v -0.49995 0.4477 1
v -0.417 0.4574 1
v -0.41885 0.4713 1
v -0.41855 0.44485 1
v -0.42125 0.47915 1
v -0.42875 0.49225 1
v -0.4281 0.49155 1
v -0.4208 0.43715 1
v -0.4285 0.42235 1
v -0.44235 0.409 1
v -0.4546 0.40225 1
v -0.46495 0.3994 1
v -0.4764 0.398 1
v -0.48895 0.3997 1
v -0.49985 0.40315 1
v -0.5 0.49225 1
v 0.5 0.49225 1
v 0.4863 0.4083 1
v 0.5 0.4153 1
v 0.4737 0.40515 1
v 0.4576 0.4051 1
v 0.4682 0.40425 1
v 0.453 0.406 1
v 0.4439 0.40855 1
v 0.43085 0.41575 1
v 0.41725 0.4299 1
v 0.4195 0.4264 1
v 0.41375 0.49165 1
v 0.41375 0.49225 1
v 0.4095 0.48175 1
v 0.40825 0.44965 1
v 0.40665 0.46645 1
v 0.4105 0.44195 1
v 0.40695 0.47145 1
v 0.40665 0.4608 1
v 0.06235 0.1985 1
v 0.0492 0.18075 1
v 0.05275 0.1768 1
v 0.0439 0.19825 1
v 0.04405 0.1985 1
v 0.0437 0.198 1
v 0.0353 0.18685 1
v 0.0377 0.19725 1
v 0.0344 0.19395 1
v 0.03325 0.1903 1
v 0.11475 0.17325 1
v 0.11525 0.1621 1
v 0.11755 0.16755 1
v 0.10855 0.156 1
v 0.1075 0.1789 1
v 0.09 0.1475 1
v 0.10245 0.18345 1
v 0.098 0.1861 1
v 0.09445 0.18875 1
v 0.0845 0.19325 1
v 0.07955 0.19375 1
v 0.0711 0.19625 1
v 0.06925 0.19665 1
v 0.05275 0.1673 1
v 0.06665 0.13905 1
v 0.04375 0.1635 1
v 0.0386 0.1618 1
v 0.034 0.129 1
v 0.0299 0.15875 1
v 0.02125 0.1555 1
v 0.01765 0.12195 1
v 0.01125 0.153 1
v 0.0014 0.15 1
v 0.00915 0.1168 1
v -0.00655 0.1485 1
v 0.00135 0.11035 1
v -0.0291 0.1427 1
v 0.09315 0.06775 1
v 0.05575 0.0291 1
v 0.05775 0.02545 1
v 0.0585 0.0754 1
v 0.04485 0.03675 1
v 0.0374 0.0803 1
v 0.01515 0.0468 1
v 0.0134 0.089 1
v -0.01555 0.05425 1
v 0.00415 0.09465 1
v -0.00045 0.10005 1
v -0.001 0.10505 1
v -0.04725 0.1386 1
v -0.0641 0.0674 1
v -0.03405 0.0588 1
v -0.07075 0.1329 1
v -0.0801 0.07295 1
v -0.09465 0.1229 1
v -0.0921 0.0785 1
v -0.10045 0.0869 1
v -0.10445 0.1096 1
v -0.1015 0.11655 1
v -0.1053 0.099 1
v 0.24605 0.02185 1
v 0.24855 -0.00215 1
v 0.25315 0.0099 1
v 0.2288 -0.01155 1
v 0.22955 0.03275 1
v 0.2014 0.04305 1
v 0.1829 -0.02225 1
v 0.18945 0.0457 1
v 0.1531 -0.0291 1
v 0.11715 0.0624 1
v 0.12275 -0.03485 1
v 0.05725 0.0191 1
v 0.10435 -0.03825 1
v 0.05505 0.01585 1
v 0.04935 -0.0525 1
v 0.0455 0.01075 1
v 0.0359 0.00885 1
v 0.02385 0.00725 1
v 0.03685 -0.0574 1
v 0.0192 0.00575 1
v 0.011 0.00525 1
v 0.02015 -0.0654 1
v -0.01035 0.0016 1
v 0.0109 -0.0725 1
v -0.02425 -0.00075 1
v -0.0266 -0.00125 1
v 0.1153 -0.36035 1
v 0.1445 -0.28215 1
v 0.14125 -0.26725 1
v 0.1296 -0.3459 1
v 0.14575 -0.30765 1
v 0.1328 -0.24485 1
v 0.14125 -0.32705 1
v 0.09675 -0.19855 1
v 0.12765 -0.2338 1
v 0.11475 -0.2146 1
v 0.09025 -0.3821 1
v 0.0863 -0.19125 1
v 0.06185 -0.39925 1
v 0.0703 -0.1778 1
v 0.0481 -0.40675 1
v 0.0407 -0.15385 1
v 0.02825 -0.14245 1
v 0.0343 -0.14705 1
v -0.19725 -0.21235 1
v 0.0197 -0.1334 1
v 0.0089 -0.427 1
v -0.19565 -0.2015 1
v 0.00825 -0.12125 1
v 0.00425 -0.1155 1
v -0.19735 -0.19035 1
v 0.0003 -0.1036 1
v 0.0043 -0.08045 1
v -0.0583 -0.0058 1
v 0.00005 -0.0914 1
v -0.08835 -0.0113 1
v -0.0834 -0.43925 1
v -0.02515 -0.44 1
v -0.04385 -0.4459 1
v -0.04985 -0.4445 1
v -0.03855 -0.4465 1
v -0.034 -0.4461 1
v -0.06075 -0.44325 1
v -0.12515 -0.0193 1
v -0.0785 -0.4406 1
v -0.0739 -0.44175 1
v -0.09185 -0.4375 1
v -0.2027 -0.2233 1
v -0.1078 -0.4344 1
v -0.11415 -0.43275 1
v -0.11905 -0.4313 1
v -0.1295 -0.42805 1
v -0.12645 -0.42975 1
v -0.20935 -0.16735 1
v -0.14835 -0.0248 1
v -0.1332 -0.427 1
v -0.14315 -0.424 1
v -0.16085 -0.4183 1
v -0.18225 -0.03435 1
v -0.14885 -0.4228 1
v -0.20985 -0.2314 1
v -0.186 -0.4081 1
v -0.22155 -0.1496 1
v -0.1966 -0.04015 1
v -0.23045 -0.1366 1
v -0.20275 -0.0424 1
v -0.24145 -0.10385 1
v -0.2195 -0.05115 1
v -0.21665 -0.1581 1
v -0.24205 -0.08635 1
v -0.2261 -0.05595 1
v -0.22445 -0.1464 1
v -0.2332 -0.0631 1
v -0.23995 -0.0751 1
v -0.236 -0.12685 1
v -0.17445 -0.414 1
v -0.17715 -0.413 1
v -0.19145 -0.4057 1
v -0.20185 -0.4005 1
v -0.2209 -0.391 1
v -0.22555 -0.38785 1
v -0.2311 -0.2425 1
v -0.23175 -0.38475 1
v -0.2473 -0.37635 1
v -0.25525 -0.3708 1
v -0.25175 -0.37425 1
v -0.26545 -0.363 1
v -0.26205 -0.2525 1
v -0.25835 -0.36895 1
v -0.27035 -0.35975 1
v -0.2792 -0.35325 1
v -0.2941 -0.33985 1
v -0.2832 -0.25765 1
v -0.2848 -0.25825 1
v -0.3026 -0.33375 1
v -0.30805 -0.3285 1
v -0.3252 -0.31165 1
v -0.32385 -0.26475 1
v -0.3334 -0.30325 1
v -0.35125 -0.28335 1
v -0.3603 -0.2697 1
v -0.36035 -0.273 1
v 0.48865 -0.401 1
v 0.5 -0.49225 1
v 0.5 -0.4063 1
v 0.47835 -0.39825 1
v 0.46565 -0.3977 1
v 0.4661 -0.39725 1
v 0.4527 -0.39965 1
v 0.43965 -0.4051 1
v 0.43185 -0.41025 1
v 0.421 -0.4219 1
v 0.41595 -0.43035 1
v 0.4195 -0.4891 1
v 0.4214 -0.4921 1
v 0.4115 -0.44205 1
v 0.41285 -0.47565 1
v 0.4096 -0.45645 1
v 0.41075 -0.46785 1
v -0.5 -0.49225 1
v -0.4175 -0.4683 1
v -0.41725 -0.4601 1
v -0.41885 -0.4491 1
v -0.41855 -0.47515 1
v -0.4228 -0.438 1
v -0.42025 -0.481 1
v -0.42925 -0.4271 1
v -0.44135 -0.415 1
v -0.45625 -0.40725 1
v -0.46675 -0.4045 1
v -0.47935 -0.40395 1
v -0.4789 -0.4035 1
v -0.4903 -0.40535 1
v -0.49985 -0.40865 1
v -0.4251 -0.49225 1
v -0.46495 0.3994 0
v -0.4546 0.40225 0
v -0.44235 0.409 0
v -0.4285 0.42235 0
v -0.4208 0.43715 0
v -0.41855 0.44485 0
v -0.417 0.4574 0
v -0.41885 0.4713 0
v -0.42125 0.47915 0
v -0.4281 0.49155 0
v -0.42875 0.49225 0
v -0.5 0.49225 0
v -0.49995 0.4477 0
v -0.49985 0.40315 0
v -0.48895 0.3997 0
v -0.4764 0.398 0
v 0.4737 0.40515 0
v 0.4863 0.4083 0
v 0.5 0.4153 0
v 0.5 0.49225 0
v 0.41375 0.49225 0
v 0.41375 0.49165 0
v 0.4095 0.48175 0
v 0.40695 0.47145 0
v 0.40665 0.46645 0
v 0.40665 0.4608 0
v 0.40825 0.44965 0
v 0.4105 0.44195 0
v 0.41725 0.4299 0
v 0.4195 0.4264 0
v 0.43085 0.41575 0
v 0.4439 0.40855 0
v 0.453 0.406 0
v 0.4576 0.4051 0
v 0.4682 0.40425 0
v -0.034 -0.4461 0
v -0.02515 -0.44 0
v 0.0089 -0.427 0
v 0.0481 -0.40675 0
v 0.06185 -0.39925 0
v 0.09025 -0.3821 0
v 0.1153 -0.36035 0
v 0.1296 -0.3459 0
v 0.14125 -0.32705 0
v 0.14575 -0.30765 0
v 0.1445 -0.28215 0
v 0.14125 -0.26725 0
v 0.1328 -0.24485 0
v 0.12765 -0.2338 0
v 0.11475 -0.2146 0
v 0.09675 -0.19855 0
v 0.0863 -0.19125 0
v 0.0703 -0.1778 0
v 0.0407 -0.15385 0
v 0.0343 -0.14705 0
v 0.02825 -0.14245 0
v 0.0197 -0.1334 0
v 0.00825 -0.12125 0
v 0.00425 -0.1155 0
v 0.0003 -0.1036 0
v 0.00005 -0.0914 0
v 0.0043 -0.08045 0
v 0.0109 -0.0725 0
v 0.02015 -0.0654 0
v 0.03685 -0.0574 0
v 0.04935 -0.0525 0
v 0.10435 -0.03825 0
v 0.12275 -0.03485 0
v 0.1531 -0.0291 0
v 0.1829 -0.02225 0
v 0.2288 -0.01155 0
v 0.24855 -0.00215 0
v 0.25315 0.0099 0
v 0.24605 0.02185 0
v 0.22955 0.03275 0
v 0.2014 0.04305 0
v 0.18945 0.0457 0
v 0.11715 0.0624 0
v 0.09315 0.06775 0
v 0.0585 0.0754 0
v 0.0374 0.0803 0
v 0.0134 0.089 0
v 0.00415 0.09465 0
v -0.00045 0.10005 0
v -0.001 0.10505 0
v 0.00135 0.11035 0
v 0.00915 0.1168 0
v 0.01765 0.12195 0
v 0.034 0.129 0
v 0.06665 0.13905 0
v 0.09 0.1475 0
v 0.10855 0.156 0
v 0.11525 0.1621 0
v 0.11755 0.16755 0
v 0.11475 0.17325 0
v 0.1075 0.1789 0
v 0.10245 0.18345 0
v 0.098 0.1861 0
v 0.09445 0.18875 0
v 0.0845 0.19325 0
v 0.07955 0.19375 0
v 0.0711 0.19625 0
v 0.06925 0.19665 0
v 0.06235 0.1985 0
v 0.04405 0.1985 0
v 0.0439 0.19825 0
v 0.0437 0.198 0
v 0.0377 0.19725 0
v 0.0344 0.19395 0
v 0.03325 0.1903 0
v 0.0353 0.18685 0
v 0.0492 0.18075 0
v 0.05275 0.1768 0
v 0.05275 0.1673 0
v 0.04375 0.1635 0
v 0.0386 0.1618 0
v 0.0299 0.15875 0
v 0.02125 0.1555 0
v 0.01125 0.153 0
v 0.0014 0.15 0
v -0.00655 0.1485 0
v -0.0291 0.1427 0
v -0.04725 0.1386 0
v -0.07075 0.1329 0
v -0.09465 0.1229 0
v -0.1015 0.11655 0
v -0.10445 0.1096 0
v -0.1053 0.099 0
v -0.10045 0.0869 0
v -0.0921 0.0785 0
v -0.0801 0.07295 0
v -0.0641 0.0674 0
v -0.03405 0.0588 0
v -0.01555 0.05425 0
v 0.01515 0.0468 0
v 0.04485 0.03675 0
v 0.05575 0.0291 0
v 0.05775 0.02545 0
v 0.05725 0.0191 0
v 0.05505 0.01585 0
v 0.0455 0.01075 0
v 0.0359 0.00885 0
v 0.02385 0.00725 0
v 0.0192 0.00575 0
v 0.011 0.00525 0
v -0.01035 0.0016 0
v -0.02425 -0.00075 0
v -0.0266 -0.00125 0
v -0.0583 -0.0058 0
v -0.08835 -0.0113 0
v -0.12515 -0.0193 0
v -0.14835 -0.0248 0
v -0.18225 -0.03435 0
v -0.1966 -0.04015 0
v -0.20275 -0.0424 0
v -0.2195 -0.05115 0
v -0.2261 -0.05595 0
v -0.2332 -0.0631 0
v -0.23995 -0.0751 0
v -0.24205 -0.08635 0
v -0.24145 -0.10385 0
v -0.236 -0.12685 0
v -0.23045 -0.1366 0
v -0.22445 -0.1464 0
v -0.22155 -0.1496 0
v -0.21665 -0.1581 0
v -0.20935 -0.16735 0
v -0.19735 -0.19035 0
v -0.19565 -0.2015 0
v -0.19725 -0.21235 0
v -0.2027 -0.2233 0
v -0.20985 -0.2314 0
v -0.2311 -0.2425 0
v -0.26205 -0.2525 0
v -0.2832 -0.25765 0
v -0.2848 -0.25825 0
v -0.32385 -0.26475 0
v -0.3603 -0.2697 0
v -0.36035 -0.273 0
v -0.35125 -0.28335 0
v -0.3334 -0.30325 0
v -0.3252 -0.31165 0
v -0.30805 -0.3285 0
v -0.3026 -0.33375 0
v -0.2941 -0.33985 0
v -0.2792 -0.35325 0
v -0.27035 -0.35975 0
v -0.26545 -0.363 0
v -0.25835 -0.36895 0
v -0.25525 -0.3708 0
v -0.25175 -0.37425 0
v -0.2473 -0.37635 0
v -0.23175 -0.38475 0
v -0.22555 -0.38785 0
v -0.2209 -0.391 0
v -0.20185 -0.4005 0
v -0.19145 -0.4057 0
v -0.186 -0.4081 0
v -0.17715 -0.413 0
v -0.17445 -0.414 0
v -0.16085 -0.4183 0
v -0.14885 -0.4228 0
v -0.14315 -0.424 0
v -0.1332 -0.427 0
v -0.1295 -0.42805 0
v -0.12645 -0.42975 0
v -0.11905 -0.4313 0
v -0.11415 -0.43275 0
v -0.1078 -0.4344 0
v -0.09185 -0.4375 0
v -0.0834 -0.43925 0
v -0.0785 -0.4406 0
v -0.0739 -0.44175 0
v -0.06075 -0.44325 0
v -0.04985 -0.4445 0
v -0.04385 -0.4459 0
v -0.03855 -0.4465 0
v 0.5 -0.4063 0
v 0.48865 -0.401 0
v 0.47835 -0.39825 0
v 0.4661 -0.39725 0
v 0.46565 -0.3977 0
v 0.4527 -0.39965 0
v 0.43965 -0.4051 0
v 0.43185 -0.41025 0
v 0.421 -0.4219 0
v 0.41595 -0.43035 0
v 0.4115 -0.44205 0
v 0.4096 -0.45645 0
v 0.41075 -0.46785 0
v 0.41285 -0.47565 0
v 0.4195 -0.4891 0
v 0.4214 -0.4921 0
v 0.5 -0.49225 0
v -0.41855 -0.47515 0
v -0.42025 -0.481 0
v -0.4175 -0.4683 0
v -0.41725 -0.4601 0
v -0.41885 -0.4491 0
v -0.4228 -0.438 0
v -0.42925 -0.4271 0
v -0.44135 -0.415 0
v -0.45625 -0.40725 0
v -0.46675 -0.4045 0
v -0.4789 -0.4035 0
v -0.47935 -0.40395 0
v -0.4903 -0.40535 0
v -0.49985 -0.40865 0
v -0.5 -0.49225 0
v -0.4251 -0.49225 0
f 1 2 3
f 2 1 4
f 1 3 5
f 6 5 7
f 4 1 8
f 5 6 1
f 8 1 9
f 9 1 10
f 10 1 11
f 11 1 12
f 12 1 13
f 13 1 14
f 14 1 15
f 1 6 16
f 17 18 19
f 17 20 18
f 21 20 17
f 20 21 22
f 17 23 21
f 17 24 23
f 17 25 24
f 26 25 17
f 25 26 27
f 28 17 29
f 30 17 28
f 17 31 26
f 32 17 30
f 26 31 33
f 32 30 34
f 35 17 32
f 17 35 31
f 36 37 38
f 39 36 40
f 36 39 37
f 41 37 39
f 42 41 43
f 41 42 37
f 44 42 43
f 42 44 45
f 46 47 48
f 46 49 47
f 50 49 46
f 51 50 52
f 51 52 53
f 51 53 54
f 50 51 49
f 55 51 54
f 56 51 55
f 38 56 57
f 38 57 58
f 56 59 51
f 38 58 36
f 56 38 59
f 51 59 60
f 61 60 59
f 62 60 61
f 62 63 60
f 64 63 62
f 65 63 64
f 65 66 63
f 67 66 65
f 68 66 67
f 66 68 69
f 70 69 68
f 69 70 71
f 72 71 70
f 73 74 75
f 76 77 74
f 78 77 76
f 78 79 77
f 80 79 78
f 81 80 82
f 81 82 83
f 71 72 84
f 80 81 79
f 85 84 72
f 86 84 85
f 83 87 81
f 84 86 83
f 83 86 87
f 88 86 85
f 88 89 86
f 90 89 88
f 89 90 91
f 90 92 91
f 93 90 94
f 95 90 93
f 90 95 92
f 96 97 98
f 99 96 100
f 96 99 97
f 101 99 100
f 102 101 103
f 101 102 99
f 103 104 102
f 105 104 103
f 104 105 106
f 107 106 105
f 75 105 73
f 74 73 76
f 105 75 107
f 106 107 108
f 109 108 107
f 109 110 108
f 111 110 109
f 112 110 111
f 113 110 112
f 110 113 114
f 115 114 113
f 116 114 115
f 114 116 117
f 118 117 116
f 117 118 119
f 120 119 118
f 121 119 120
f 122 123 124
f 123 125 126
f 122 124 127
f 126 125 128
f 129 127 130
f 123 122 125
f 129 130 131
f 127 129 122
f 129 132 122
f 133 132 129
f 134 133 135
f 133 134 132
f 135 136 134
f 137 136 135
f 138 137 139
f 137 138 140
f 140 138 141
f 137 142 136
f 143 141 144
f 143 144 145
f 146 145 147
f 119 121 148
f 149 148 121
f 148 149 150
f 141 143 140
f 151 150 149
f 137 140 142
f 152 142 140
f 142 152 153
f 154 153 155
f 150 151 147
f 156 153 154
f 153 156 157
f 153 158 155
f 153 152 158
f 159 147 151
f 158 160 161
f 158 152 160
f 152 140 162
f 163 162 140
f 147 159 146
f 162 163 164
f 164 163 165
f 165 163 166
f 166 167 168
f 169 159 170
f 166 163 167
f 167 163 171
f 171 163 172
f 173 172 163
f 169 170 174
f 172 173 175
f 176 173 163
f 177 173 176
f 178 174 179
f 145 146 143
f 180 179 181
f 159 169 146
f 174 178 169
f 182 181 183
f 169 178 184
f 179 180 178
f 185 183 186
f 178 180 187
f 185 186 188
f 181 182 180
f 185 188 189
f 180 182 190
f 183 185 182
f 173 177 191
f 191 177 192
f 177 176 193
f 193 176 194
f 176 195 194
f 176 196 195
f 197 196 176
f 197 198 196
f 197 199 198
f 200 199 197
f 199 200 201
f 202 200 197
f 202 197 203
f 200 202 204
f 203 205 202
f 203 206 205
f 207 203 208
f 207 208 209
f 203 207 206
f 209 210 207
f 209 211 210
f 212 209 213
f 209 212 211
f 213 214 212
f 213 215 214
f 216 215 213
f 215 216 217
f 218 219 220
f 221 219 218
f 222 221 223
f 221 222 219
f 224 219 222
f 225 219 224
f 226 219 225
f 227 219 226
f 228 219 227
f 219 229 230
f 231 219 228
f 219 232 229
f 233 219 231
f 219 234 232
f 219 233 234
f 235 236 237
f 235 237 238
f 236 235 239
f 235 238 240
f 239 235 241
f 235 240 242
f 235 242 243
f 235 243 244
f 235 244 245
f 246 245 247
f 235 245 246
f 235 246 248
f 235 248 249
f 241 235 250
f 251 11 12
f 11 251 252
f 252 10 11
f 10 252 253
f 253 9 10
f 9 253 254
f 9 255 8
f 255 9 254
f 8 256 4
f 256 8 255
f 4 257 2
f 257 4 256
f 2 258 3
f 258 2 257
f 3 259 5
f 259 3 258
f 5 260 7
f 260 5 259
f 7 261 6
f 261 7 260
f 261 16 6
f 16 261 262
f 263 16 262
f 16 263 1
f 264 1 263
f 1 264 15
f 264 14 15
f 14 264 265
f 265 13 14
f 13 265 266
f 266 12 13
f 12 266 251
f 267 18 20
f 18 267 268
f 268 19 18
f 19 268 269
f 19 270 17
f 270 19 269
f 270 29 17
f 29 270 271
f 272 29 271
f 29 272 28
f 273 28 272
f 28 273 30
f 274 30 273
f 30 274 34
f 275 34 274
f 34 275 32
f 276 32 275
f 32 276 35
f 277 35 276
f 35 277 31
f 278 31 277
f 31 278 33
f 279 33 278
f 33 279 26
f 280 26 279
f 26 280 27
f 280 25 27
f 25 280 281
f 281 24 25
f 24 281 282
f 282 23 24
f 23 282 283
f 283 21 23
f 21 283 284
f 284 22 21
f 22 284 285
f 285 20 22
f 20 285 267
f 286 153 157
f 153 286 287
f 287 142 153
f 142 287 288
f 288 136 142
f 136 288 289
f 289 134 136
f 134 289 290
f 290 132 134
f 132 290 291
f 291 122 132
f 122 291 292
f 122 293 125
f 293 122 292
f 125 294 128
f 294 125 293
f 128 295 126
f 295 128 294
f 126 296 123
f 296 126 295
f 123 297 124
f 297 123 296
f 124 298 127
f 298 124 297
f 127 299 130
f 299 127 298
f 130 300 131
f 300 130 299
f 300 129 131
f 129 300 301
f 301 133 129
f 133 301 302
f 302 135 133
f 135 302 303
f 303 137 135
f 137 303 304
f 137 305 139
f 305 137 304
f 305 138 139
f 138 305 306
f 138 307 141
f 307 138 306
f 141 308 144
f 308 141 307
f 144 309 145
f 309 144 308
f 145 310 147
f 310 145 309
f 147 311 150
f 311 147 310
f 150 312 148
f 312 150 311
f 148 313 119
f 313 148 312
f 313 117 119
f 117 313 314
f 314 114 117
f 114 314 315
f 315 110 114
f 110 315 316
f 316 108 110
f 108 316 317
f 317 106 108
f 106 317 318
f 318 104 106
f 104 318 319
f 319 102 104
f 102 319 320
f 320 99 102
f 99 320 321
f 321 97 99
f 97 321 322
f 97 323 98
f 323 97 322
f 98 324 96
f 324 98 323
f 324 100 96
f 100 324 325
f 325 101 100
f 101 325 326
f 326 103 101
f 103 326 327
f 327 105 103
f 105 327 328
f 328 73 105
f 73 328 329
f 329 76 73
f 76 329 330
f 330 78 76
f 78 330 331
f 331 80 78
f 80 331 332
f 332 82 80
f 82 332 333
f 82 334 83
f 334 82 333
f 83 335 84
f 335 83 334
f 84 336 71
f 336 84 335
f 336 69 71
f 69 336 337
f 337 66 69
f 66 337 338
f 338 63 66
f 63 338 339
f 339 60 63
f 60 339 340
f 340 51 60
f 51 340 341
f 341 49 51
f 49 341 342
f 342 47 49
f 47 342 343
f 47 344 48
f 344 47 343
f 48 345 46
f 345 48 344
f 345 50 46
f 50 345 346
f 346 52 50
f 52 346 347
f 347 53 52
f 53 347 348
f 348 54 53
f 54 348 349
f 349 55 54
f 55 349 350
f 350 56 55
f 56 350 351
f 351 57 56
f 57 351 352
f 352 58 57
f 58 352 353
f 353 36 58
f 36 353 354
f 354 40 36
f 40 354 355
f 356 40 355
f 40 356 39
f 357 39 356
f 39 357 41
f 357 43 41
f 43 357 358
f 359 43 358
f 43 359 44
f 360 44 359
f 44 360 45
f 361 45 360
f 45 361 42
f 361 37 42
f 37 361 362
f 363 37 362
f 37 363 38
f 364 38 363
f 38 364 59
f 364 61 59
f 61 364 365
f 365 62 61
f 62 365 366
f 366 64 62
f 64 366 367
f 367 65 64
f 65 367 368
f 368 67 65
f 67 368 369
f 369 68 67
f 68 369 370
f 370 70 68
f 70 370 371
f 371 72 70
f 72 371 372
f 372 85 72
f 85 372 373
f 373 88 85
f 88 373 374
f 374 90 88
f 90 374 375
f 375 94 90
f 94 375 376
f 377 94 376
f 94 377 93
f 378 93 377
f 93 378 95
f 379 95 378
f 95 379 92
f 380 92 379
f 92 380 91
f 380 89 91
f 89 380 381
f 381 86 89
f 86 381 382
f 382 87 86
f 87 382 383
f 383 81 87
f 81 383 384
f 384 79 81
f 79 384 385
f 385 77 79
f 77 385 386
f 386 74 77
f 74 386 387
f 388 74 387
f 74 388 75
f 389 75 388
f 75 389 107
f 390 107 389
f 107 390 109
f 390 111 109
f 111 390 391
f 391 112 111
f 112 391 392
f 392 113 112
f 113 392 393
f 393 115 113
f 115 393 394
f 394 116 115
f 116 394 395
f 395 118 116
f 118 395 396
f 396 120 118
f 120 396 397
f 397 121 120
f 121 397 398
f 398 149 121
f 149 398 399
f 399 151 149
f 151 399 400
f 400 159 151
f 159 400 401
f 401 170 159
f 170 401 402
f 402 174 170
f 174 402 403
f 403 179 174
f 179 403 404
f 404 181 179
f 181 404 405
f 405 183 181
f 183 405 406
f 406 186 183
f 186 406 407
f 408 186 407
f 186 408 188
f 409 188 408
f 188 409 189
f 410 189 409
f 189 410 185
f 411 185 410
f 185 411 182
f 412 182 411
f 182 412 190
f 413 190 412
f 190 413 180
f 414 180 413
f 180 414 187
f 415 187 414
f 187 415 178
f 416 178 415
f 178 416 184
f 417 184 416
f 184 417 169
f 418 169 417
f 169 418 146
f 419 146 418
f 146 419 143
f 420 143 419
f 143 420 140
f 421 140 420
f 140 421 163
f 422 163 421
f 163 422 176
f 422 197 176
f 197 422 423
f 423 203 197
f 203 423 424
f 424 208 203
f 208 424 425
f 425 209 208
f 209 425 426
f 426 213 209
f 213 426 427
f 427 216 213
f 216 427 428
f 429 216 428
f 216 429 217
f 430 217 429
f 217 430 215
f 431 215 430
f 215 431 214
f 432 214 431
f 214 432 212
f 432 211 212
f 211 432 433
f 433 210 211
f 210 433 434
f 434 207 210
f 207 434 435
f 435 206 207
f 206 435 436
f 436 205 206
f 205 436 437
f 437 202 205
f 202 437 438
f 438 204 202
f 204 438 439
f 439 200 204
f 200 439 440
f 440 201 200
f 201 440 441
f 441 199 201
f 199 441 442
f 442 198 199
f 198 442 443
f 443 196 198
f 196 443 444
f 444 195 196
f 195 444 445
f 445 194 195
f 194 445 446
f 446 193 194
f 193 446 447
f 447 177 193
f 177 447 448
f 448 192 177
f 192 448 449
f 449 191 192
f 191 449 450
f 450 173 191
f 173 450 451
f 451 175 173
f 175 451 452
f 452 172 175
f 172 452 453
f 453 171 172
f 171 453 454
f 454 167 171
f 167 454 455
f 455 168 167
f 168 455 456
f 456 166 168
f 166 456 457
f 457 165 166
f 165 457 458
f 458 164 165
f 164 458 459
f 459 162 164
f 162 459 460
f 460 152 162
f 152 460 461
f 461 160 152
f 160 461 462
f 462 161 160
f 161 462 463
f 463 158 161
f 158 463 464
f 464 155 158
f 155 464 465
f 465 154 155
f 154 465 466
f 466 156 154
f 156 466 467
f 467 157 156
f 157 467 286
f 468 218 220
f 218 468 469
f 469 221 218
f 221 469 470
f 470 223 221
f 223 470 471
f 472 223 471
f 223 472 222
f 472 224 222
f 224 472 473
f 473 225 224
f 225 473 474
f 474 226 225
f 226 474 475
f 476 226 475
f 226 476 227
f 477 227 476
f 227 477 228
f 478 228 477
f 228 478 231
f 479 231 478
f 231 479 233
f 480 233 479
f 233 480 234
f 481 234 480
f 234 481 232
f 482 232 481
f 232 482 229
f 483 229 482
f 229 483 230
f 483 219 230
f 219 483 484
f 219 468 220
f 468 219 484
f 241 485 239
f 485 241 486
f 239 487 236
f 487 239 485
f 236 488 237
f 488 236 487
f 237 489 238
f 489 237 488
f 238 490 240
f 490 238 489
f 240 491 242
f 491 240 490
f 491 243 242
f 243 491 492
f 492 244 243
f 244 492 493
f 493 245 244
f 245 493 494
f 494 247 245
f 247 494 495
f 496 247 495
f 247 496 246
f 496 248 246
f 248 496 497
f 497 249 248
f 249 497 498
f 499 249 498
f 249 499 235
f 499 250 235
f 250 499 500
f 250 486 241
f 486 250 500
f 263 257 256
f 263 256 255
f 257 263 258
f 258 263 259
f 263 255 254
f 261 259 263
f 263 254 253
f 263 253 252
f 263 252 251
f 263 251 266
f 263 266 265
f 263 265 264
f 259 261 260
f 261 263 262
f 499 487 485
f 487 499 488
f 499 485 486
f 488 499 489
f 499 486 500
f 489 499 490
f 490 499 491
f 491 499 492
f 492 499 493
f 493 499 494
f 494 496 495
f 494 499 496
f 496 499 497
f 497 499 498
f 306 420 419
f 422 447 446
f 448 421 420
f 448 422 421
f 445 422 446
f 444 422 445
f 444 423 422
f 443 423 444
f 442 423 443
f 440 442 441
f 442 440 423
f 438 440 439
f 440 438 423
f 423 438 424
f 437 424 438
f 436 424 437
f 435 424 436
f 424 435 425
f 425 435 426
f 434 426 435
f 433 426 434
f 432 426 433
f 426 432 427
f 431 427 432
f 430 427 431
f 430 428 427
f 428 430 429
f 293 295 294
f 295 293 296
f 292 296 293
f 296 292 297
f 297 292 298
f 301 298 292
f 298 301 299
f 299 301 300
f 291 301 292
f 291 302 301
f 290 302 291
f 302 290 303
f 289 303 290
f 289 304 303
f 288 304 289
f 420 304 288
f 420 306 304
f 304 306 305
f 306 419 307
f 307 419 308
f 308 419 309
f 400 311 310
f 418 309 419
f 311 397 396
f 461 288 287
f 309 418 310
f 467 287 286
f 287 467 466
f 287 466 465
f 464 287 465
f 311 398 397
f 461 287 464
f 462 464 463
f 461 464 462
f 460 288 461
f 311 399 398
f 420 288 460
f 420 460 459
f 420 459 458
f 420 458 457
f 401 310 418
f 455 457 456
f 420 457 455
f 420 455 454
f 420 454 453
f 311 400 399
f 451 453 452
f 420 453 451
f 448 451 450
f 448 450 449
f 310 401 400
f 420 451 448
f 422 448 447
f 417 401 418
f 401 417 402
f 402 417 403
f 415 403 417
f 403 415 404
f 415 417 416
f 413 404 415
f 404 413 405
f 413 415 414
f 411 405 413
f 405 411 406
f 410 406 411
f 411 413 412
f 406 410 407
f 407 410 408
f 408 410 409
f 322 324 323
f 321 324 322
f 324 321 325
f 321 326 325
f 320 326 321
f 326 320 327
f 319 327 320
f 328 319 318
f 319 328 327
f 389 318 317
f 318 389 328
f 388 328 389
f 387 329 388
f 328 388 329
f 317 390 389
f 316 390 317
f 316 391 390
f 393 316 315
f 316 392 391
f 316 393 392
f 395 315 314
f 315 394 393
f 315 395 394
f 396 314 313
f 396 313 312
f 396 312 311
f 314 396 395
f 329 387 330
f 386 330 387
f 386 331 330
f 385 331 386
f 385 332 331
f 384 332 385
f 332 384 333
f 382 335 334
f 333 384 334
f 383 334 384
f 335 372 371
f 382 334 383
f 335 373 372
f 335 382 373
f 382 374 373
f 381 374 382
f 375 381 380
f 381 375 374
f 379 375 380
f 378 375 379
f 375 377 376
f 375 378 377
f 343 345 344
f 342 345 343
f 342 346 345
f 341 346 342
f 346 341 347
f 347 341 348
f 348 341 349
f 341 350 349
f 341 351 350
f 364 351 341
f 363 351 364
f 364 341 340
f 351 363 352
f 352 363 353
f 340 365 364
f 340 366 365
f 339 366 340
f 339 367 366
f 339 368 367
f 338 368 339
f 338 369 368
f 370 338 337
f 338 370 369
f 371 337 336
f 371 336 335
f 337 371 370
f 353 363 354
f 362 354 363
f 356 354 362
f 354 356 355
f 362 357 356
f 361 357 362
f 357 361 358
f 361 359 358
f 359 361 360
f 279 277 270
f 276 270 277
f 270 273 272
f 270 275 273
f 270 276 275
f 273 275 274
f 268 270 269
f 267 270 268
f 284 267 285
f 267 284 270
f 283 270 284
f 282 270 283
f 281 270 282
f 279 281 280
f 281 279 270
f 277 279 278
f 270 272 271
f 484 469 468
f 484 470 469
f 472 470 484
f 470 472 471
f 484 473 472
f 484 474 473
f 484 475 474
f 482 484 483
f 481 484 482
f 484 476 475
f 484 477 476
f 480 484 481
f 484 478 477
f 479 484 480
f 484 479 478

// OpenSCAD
module C1purple2_1()
{
 /* Generated by trace2scad version 20150415
    http://aggregate.org/MAKE/TRACE2SCAD/
    Optimized model has 253/3033 original points
 */
 color([0.5, 0.5, 0.5])
 assign(minx=0) /* polygon minx=0 */
 assign(miny=0) /* polygon miny=0 */
 assign(maxx=20000) /* polygon maxx=20000 */
 assign(maxy=19690) /* polygon maxy=19690 */
 assign(dx=maxx-minx)
 assign(dy=maxy-miny)
 assign(maxd=((dx>dy)?dx:dy))
 scale([1/maxd, 1/maxd, 1])
 translate([-minx-dx/2, -miny-dy/2, 0])
 linear_extrude(height=1, convexity=253)
 union() {
  union() {
   polygon([[1,18799],[3,17908],[221,17839],[472,17805],[701,17833],[908,17890],[1153,18025],[1430,18292],[1584,18588],[1629,18742],[1660,18993],[1623,19271],[1575,19428],[1438,19676],[1425,19690],[0,19690]], convexity=5);
   polygon([[18275,19684],[18275,19678],[18190,19480],[18139,19274],[18133,19174],[18133,19061],[18165,18838],[18210,18684],[18345,18443],[18390,18373],[18617,18160],[18878,18016],[19060,17965],[19152,17947],[19364,17930],[19474,17948],[19726,18011],[20000,18151],[20000,19690],[18275,19690]], convexity=7);
   polygon([[10878,13810],[10874,13805],[10754,13790],[10688,13724],[10665,13651],[10706,13582],[10984,13460],[11055,13381],[11055,13191],[10875,13115],[10772,13081],[10598,13020],[10425,12955],[10225,12905],[10028,12845],[9869,12815],[9418,12699],[9055,12617],[8585,12503],[8107,12303],[7970,12176],[7911,12037],[7894,11825],[7991,11583],[8158,11415],[8398,11304],[8718,11193],[9319,11021],[9689,10930],[10303,10781],[10897,10580],[11115,10427],[11155,10354],[11145,10227],[11101,10162],[10910,10060],[10718,10022],[10477,9990],[10384,9960],[10220,9950],[9793,9877],[9515,9830],[9468,9820],[8834,9729],[8233,9619],[7497,9459],[7033,9349],[6355,9158],[6068,9042],[5945,8997],[5610,8822],[5478,8726],[5336,8583],[5201,8343],[5159,8118],[5171,7768],[5280,7308],[5391,7113],[5511,6917],[5569,6853],[5667,6683],[5813,6498],[6053,6038],[6087,5815],[6055,5598],[5946,5379],[5803,5217],[5378,4995],[4759,4795],[4336,4692],[4304,4680],[3523,4550],[2794,4451],[2793,4385],[2975,4178],[3332,3780],[3496,3612],[3839,3275],[3948,3170],[4118,3048],[4416,2780],[4593,2650],[4691,2585],[4833,2466],[4895,2429],[4965,2360],[5054,2318],[5365,2150],[5489,2088],[5582,2025],[5963,1835],[6171,1731],[6280,1683],[6457,1585],[6511,1565],[6783,1479],[7023,1389],[7137,1365],[7336,1305],[7410,1284],[7471,1250],[7619,1219],[7717,1190],[7844,1157],[8163,1095],[8332,1060],[8430,1033],[8522,1010],[8785,980],[9003,955],[9123,927],[9229,915],[9320,923],[9497,1045],[10178,1305],[10962,1710],[11237,1860],[11805,2203],[12306,2638],[12592,2927],[12825,3304],[12915,3692],[12890,4202],[12825,4500],[12656,4948],[12553,5169],[12295,5553],[11935,5874],[11726,6020],[11406,6289],[10814,6768],[10686,6904],[10565,6996],[10394,7177],[10165,7420],[10085,7535],[10006,7773],[10001,8017],[10086,8236],[10218,8395],[10403,8537],[10737,8697],[10987,8795],[12087,9080],[12455,9148],[13062,9263],[13658,9400],[14576,9614],[14971,9802],[15063,10043],[14921,10282],[14591,10500],[14028,10706],[13789,10759],[12343,11093],[11863,11200],[11170,11353],[10748,11451],[10268,11625],[10083,11738],[9991,11846],[9980,11946],[10027,12052],[10183,12181],[10353,12284],[10680,12425],[11333,12626],[11800,12795],[12171,12965],[12305,13087],[12351,13196],[12295,13310],[12150,13423],[12049,13514],[11960,13567],[11889,13620],[11690,13710],[11591,13720],[11422,13770],[11385,13778],[11247,13815],[10881,13815]], convexity=16);
   polygon([[19317,1895],[19313,1891],[19054,1852],[18793,1743],[18637,1640],[18420,1407],[18319,1238],[18230,1004],[18192,716],[18215,488],[18257,332],[18390,63],[18428,3],[20000,0],[20000,1719],[19773,1825],[19567,1880],[19322,1900]], convexity=6);
   polygon([[417,1770],[413,1766],[194,1738],[3,1672],[0,0],[1498,0],[1595,225],[1629,342],[1650,479],[1655,643],[1623,863],[1544,1085],[1415,1303],[1173,1545],[875,1700],[665,1755],[422,1775]], convexity=5);
  }
 }
}

module C1purple2()
{
 /* all layers combined, scaled to within a 1mm cube */
 scale([1, 1, 1/1])
 difference() {
  union() {
   scale([1,1,2]) translate([0,0,-0.5]) C1purple2_1();
  }
  translate([0,0,-2]) cube([2,2,4],center=true);
 }
}
C1purple2();
